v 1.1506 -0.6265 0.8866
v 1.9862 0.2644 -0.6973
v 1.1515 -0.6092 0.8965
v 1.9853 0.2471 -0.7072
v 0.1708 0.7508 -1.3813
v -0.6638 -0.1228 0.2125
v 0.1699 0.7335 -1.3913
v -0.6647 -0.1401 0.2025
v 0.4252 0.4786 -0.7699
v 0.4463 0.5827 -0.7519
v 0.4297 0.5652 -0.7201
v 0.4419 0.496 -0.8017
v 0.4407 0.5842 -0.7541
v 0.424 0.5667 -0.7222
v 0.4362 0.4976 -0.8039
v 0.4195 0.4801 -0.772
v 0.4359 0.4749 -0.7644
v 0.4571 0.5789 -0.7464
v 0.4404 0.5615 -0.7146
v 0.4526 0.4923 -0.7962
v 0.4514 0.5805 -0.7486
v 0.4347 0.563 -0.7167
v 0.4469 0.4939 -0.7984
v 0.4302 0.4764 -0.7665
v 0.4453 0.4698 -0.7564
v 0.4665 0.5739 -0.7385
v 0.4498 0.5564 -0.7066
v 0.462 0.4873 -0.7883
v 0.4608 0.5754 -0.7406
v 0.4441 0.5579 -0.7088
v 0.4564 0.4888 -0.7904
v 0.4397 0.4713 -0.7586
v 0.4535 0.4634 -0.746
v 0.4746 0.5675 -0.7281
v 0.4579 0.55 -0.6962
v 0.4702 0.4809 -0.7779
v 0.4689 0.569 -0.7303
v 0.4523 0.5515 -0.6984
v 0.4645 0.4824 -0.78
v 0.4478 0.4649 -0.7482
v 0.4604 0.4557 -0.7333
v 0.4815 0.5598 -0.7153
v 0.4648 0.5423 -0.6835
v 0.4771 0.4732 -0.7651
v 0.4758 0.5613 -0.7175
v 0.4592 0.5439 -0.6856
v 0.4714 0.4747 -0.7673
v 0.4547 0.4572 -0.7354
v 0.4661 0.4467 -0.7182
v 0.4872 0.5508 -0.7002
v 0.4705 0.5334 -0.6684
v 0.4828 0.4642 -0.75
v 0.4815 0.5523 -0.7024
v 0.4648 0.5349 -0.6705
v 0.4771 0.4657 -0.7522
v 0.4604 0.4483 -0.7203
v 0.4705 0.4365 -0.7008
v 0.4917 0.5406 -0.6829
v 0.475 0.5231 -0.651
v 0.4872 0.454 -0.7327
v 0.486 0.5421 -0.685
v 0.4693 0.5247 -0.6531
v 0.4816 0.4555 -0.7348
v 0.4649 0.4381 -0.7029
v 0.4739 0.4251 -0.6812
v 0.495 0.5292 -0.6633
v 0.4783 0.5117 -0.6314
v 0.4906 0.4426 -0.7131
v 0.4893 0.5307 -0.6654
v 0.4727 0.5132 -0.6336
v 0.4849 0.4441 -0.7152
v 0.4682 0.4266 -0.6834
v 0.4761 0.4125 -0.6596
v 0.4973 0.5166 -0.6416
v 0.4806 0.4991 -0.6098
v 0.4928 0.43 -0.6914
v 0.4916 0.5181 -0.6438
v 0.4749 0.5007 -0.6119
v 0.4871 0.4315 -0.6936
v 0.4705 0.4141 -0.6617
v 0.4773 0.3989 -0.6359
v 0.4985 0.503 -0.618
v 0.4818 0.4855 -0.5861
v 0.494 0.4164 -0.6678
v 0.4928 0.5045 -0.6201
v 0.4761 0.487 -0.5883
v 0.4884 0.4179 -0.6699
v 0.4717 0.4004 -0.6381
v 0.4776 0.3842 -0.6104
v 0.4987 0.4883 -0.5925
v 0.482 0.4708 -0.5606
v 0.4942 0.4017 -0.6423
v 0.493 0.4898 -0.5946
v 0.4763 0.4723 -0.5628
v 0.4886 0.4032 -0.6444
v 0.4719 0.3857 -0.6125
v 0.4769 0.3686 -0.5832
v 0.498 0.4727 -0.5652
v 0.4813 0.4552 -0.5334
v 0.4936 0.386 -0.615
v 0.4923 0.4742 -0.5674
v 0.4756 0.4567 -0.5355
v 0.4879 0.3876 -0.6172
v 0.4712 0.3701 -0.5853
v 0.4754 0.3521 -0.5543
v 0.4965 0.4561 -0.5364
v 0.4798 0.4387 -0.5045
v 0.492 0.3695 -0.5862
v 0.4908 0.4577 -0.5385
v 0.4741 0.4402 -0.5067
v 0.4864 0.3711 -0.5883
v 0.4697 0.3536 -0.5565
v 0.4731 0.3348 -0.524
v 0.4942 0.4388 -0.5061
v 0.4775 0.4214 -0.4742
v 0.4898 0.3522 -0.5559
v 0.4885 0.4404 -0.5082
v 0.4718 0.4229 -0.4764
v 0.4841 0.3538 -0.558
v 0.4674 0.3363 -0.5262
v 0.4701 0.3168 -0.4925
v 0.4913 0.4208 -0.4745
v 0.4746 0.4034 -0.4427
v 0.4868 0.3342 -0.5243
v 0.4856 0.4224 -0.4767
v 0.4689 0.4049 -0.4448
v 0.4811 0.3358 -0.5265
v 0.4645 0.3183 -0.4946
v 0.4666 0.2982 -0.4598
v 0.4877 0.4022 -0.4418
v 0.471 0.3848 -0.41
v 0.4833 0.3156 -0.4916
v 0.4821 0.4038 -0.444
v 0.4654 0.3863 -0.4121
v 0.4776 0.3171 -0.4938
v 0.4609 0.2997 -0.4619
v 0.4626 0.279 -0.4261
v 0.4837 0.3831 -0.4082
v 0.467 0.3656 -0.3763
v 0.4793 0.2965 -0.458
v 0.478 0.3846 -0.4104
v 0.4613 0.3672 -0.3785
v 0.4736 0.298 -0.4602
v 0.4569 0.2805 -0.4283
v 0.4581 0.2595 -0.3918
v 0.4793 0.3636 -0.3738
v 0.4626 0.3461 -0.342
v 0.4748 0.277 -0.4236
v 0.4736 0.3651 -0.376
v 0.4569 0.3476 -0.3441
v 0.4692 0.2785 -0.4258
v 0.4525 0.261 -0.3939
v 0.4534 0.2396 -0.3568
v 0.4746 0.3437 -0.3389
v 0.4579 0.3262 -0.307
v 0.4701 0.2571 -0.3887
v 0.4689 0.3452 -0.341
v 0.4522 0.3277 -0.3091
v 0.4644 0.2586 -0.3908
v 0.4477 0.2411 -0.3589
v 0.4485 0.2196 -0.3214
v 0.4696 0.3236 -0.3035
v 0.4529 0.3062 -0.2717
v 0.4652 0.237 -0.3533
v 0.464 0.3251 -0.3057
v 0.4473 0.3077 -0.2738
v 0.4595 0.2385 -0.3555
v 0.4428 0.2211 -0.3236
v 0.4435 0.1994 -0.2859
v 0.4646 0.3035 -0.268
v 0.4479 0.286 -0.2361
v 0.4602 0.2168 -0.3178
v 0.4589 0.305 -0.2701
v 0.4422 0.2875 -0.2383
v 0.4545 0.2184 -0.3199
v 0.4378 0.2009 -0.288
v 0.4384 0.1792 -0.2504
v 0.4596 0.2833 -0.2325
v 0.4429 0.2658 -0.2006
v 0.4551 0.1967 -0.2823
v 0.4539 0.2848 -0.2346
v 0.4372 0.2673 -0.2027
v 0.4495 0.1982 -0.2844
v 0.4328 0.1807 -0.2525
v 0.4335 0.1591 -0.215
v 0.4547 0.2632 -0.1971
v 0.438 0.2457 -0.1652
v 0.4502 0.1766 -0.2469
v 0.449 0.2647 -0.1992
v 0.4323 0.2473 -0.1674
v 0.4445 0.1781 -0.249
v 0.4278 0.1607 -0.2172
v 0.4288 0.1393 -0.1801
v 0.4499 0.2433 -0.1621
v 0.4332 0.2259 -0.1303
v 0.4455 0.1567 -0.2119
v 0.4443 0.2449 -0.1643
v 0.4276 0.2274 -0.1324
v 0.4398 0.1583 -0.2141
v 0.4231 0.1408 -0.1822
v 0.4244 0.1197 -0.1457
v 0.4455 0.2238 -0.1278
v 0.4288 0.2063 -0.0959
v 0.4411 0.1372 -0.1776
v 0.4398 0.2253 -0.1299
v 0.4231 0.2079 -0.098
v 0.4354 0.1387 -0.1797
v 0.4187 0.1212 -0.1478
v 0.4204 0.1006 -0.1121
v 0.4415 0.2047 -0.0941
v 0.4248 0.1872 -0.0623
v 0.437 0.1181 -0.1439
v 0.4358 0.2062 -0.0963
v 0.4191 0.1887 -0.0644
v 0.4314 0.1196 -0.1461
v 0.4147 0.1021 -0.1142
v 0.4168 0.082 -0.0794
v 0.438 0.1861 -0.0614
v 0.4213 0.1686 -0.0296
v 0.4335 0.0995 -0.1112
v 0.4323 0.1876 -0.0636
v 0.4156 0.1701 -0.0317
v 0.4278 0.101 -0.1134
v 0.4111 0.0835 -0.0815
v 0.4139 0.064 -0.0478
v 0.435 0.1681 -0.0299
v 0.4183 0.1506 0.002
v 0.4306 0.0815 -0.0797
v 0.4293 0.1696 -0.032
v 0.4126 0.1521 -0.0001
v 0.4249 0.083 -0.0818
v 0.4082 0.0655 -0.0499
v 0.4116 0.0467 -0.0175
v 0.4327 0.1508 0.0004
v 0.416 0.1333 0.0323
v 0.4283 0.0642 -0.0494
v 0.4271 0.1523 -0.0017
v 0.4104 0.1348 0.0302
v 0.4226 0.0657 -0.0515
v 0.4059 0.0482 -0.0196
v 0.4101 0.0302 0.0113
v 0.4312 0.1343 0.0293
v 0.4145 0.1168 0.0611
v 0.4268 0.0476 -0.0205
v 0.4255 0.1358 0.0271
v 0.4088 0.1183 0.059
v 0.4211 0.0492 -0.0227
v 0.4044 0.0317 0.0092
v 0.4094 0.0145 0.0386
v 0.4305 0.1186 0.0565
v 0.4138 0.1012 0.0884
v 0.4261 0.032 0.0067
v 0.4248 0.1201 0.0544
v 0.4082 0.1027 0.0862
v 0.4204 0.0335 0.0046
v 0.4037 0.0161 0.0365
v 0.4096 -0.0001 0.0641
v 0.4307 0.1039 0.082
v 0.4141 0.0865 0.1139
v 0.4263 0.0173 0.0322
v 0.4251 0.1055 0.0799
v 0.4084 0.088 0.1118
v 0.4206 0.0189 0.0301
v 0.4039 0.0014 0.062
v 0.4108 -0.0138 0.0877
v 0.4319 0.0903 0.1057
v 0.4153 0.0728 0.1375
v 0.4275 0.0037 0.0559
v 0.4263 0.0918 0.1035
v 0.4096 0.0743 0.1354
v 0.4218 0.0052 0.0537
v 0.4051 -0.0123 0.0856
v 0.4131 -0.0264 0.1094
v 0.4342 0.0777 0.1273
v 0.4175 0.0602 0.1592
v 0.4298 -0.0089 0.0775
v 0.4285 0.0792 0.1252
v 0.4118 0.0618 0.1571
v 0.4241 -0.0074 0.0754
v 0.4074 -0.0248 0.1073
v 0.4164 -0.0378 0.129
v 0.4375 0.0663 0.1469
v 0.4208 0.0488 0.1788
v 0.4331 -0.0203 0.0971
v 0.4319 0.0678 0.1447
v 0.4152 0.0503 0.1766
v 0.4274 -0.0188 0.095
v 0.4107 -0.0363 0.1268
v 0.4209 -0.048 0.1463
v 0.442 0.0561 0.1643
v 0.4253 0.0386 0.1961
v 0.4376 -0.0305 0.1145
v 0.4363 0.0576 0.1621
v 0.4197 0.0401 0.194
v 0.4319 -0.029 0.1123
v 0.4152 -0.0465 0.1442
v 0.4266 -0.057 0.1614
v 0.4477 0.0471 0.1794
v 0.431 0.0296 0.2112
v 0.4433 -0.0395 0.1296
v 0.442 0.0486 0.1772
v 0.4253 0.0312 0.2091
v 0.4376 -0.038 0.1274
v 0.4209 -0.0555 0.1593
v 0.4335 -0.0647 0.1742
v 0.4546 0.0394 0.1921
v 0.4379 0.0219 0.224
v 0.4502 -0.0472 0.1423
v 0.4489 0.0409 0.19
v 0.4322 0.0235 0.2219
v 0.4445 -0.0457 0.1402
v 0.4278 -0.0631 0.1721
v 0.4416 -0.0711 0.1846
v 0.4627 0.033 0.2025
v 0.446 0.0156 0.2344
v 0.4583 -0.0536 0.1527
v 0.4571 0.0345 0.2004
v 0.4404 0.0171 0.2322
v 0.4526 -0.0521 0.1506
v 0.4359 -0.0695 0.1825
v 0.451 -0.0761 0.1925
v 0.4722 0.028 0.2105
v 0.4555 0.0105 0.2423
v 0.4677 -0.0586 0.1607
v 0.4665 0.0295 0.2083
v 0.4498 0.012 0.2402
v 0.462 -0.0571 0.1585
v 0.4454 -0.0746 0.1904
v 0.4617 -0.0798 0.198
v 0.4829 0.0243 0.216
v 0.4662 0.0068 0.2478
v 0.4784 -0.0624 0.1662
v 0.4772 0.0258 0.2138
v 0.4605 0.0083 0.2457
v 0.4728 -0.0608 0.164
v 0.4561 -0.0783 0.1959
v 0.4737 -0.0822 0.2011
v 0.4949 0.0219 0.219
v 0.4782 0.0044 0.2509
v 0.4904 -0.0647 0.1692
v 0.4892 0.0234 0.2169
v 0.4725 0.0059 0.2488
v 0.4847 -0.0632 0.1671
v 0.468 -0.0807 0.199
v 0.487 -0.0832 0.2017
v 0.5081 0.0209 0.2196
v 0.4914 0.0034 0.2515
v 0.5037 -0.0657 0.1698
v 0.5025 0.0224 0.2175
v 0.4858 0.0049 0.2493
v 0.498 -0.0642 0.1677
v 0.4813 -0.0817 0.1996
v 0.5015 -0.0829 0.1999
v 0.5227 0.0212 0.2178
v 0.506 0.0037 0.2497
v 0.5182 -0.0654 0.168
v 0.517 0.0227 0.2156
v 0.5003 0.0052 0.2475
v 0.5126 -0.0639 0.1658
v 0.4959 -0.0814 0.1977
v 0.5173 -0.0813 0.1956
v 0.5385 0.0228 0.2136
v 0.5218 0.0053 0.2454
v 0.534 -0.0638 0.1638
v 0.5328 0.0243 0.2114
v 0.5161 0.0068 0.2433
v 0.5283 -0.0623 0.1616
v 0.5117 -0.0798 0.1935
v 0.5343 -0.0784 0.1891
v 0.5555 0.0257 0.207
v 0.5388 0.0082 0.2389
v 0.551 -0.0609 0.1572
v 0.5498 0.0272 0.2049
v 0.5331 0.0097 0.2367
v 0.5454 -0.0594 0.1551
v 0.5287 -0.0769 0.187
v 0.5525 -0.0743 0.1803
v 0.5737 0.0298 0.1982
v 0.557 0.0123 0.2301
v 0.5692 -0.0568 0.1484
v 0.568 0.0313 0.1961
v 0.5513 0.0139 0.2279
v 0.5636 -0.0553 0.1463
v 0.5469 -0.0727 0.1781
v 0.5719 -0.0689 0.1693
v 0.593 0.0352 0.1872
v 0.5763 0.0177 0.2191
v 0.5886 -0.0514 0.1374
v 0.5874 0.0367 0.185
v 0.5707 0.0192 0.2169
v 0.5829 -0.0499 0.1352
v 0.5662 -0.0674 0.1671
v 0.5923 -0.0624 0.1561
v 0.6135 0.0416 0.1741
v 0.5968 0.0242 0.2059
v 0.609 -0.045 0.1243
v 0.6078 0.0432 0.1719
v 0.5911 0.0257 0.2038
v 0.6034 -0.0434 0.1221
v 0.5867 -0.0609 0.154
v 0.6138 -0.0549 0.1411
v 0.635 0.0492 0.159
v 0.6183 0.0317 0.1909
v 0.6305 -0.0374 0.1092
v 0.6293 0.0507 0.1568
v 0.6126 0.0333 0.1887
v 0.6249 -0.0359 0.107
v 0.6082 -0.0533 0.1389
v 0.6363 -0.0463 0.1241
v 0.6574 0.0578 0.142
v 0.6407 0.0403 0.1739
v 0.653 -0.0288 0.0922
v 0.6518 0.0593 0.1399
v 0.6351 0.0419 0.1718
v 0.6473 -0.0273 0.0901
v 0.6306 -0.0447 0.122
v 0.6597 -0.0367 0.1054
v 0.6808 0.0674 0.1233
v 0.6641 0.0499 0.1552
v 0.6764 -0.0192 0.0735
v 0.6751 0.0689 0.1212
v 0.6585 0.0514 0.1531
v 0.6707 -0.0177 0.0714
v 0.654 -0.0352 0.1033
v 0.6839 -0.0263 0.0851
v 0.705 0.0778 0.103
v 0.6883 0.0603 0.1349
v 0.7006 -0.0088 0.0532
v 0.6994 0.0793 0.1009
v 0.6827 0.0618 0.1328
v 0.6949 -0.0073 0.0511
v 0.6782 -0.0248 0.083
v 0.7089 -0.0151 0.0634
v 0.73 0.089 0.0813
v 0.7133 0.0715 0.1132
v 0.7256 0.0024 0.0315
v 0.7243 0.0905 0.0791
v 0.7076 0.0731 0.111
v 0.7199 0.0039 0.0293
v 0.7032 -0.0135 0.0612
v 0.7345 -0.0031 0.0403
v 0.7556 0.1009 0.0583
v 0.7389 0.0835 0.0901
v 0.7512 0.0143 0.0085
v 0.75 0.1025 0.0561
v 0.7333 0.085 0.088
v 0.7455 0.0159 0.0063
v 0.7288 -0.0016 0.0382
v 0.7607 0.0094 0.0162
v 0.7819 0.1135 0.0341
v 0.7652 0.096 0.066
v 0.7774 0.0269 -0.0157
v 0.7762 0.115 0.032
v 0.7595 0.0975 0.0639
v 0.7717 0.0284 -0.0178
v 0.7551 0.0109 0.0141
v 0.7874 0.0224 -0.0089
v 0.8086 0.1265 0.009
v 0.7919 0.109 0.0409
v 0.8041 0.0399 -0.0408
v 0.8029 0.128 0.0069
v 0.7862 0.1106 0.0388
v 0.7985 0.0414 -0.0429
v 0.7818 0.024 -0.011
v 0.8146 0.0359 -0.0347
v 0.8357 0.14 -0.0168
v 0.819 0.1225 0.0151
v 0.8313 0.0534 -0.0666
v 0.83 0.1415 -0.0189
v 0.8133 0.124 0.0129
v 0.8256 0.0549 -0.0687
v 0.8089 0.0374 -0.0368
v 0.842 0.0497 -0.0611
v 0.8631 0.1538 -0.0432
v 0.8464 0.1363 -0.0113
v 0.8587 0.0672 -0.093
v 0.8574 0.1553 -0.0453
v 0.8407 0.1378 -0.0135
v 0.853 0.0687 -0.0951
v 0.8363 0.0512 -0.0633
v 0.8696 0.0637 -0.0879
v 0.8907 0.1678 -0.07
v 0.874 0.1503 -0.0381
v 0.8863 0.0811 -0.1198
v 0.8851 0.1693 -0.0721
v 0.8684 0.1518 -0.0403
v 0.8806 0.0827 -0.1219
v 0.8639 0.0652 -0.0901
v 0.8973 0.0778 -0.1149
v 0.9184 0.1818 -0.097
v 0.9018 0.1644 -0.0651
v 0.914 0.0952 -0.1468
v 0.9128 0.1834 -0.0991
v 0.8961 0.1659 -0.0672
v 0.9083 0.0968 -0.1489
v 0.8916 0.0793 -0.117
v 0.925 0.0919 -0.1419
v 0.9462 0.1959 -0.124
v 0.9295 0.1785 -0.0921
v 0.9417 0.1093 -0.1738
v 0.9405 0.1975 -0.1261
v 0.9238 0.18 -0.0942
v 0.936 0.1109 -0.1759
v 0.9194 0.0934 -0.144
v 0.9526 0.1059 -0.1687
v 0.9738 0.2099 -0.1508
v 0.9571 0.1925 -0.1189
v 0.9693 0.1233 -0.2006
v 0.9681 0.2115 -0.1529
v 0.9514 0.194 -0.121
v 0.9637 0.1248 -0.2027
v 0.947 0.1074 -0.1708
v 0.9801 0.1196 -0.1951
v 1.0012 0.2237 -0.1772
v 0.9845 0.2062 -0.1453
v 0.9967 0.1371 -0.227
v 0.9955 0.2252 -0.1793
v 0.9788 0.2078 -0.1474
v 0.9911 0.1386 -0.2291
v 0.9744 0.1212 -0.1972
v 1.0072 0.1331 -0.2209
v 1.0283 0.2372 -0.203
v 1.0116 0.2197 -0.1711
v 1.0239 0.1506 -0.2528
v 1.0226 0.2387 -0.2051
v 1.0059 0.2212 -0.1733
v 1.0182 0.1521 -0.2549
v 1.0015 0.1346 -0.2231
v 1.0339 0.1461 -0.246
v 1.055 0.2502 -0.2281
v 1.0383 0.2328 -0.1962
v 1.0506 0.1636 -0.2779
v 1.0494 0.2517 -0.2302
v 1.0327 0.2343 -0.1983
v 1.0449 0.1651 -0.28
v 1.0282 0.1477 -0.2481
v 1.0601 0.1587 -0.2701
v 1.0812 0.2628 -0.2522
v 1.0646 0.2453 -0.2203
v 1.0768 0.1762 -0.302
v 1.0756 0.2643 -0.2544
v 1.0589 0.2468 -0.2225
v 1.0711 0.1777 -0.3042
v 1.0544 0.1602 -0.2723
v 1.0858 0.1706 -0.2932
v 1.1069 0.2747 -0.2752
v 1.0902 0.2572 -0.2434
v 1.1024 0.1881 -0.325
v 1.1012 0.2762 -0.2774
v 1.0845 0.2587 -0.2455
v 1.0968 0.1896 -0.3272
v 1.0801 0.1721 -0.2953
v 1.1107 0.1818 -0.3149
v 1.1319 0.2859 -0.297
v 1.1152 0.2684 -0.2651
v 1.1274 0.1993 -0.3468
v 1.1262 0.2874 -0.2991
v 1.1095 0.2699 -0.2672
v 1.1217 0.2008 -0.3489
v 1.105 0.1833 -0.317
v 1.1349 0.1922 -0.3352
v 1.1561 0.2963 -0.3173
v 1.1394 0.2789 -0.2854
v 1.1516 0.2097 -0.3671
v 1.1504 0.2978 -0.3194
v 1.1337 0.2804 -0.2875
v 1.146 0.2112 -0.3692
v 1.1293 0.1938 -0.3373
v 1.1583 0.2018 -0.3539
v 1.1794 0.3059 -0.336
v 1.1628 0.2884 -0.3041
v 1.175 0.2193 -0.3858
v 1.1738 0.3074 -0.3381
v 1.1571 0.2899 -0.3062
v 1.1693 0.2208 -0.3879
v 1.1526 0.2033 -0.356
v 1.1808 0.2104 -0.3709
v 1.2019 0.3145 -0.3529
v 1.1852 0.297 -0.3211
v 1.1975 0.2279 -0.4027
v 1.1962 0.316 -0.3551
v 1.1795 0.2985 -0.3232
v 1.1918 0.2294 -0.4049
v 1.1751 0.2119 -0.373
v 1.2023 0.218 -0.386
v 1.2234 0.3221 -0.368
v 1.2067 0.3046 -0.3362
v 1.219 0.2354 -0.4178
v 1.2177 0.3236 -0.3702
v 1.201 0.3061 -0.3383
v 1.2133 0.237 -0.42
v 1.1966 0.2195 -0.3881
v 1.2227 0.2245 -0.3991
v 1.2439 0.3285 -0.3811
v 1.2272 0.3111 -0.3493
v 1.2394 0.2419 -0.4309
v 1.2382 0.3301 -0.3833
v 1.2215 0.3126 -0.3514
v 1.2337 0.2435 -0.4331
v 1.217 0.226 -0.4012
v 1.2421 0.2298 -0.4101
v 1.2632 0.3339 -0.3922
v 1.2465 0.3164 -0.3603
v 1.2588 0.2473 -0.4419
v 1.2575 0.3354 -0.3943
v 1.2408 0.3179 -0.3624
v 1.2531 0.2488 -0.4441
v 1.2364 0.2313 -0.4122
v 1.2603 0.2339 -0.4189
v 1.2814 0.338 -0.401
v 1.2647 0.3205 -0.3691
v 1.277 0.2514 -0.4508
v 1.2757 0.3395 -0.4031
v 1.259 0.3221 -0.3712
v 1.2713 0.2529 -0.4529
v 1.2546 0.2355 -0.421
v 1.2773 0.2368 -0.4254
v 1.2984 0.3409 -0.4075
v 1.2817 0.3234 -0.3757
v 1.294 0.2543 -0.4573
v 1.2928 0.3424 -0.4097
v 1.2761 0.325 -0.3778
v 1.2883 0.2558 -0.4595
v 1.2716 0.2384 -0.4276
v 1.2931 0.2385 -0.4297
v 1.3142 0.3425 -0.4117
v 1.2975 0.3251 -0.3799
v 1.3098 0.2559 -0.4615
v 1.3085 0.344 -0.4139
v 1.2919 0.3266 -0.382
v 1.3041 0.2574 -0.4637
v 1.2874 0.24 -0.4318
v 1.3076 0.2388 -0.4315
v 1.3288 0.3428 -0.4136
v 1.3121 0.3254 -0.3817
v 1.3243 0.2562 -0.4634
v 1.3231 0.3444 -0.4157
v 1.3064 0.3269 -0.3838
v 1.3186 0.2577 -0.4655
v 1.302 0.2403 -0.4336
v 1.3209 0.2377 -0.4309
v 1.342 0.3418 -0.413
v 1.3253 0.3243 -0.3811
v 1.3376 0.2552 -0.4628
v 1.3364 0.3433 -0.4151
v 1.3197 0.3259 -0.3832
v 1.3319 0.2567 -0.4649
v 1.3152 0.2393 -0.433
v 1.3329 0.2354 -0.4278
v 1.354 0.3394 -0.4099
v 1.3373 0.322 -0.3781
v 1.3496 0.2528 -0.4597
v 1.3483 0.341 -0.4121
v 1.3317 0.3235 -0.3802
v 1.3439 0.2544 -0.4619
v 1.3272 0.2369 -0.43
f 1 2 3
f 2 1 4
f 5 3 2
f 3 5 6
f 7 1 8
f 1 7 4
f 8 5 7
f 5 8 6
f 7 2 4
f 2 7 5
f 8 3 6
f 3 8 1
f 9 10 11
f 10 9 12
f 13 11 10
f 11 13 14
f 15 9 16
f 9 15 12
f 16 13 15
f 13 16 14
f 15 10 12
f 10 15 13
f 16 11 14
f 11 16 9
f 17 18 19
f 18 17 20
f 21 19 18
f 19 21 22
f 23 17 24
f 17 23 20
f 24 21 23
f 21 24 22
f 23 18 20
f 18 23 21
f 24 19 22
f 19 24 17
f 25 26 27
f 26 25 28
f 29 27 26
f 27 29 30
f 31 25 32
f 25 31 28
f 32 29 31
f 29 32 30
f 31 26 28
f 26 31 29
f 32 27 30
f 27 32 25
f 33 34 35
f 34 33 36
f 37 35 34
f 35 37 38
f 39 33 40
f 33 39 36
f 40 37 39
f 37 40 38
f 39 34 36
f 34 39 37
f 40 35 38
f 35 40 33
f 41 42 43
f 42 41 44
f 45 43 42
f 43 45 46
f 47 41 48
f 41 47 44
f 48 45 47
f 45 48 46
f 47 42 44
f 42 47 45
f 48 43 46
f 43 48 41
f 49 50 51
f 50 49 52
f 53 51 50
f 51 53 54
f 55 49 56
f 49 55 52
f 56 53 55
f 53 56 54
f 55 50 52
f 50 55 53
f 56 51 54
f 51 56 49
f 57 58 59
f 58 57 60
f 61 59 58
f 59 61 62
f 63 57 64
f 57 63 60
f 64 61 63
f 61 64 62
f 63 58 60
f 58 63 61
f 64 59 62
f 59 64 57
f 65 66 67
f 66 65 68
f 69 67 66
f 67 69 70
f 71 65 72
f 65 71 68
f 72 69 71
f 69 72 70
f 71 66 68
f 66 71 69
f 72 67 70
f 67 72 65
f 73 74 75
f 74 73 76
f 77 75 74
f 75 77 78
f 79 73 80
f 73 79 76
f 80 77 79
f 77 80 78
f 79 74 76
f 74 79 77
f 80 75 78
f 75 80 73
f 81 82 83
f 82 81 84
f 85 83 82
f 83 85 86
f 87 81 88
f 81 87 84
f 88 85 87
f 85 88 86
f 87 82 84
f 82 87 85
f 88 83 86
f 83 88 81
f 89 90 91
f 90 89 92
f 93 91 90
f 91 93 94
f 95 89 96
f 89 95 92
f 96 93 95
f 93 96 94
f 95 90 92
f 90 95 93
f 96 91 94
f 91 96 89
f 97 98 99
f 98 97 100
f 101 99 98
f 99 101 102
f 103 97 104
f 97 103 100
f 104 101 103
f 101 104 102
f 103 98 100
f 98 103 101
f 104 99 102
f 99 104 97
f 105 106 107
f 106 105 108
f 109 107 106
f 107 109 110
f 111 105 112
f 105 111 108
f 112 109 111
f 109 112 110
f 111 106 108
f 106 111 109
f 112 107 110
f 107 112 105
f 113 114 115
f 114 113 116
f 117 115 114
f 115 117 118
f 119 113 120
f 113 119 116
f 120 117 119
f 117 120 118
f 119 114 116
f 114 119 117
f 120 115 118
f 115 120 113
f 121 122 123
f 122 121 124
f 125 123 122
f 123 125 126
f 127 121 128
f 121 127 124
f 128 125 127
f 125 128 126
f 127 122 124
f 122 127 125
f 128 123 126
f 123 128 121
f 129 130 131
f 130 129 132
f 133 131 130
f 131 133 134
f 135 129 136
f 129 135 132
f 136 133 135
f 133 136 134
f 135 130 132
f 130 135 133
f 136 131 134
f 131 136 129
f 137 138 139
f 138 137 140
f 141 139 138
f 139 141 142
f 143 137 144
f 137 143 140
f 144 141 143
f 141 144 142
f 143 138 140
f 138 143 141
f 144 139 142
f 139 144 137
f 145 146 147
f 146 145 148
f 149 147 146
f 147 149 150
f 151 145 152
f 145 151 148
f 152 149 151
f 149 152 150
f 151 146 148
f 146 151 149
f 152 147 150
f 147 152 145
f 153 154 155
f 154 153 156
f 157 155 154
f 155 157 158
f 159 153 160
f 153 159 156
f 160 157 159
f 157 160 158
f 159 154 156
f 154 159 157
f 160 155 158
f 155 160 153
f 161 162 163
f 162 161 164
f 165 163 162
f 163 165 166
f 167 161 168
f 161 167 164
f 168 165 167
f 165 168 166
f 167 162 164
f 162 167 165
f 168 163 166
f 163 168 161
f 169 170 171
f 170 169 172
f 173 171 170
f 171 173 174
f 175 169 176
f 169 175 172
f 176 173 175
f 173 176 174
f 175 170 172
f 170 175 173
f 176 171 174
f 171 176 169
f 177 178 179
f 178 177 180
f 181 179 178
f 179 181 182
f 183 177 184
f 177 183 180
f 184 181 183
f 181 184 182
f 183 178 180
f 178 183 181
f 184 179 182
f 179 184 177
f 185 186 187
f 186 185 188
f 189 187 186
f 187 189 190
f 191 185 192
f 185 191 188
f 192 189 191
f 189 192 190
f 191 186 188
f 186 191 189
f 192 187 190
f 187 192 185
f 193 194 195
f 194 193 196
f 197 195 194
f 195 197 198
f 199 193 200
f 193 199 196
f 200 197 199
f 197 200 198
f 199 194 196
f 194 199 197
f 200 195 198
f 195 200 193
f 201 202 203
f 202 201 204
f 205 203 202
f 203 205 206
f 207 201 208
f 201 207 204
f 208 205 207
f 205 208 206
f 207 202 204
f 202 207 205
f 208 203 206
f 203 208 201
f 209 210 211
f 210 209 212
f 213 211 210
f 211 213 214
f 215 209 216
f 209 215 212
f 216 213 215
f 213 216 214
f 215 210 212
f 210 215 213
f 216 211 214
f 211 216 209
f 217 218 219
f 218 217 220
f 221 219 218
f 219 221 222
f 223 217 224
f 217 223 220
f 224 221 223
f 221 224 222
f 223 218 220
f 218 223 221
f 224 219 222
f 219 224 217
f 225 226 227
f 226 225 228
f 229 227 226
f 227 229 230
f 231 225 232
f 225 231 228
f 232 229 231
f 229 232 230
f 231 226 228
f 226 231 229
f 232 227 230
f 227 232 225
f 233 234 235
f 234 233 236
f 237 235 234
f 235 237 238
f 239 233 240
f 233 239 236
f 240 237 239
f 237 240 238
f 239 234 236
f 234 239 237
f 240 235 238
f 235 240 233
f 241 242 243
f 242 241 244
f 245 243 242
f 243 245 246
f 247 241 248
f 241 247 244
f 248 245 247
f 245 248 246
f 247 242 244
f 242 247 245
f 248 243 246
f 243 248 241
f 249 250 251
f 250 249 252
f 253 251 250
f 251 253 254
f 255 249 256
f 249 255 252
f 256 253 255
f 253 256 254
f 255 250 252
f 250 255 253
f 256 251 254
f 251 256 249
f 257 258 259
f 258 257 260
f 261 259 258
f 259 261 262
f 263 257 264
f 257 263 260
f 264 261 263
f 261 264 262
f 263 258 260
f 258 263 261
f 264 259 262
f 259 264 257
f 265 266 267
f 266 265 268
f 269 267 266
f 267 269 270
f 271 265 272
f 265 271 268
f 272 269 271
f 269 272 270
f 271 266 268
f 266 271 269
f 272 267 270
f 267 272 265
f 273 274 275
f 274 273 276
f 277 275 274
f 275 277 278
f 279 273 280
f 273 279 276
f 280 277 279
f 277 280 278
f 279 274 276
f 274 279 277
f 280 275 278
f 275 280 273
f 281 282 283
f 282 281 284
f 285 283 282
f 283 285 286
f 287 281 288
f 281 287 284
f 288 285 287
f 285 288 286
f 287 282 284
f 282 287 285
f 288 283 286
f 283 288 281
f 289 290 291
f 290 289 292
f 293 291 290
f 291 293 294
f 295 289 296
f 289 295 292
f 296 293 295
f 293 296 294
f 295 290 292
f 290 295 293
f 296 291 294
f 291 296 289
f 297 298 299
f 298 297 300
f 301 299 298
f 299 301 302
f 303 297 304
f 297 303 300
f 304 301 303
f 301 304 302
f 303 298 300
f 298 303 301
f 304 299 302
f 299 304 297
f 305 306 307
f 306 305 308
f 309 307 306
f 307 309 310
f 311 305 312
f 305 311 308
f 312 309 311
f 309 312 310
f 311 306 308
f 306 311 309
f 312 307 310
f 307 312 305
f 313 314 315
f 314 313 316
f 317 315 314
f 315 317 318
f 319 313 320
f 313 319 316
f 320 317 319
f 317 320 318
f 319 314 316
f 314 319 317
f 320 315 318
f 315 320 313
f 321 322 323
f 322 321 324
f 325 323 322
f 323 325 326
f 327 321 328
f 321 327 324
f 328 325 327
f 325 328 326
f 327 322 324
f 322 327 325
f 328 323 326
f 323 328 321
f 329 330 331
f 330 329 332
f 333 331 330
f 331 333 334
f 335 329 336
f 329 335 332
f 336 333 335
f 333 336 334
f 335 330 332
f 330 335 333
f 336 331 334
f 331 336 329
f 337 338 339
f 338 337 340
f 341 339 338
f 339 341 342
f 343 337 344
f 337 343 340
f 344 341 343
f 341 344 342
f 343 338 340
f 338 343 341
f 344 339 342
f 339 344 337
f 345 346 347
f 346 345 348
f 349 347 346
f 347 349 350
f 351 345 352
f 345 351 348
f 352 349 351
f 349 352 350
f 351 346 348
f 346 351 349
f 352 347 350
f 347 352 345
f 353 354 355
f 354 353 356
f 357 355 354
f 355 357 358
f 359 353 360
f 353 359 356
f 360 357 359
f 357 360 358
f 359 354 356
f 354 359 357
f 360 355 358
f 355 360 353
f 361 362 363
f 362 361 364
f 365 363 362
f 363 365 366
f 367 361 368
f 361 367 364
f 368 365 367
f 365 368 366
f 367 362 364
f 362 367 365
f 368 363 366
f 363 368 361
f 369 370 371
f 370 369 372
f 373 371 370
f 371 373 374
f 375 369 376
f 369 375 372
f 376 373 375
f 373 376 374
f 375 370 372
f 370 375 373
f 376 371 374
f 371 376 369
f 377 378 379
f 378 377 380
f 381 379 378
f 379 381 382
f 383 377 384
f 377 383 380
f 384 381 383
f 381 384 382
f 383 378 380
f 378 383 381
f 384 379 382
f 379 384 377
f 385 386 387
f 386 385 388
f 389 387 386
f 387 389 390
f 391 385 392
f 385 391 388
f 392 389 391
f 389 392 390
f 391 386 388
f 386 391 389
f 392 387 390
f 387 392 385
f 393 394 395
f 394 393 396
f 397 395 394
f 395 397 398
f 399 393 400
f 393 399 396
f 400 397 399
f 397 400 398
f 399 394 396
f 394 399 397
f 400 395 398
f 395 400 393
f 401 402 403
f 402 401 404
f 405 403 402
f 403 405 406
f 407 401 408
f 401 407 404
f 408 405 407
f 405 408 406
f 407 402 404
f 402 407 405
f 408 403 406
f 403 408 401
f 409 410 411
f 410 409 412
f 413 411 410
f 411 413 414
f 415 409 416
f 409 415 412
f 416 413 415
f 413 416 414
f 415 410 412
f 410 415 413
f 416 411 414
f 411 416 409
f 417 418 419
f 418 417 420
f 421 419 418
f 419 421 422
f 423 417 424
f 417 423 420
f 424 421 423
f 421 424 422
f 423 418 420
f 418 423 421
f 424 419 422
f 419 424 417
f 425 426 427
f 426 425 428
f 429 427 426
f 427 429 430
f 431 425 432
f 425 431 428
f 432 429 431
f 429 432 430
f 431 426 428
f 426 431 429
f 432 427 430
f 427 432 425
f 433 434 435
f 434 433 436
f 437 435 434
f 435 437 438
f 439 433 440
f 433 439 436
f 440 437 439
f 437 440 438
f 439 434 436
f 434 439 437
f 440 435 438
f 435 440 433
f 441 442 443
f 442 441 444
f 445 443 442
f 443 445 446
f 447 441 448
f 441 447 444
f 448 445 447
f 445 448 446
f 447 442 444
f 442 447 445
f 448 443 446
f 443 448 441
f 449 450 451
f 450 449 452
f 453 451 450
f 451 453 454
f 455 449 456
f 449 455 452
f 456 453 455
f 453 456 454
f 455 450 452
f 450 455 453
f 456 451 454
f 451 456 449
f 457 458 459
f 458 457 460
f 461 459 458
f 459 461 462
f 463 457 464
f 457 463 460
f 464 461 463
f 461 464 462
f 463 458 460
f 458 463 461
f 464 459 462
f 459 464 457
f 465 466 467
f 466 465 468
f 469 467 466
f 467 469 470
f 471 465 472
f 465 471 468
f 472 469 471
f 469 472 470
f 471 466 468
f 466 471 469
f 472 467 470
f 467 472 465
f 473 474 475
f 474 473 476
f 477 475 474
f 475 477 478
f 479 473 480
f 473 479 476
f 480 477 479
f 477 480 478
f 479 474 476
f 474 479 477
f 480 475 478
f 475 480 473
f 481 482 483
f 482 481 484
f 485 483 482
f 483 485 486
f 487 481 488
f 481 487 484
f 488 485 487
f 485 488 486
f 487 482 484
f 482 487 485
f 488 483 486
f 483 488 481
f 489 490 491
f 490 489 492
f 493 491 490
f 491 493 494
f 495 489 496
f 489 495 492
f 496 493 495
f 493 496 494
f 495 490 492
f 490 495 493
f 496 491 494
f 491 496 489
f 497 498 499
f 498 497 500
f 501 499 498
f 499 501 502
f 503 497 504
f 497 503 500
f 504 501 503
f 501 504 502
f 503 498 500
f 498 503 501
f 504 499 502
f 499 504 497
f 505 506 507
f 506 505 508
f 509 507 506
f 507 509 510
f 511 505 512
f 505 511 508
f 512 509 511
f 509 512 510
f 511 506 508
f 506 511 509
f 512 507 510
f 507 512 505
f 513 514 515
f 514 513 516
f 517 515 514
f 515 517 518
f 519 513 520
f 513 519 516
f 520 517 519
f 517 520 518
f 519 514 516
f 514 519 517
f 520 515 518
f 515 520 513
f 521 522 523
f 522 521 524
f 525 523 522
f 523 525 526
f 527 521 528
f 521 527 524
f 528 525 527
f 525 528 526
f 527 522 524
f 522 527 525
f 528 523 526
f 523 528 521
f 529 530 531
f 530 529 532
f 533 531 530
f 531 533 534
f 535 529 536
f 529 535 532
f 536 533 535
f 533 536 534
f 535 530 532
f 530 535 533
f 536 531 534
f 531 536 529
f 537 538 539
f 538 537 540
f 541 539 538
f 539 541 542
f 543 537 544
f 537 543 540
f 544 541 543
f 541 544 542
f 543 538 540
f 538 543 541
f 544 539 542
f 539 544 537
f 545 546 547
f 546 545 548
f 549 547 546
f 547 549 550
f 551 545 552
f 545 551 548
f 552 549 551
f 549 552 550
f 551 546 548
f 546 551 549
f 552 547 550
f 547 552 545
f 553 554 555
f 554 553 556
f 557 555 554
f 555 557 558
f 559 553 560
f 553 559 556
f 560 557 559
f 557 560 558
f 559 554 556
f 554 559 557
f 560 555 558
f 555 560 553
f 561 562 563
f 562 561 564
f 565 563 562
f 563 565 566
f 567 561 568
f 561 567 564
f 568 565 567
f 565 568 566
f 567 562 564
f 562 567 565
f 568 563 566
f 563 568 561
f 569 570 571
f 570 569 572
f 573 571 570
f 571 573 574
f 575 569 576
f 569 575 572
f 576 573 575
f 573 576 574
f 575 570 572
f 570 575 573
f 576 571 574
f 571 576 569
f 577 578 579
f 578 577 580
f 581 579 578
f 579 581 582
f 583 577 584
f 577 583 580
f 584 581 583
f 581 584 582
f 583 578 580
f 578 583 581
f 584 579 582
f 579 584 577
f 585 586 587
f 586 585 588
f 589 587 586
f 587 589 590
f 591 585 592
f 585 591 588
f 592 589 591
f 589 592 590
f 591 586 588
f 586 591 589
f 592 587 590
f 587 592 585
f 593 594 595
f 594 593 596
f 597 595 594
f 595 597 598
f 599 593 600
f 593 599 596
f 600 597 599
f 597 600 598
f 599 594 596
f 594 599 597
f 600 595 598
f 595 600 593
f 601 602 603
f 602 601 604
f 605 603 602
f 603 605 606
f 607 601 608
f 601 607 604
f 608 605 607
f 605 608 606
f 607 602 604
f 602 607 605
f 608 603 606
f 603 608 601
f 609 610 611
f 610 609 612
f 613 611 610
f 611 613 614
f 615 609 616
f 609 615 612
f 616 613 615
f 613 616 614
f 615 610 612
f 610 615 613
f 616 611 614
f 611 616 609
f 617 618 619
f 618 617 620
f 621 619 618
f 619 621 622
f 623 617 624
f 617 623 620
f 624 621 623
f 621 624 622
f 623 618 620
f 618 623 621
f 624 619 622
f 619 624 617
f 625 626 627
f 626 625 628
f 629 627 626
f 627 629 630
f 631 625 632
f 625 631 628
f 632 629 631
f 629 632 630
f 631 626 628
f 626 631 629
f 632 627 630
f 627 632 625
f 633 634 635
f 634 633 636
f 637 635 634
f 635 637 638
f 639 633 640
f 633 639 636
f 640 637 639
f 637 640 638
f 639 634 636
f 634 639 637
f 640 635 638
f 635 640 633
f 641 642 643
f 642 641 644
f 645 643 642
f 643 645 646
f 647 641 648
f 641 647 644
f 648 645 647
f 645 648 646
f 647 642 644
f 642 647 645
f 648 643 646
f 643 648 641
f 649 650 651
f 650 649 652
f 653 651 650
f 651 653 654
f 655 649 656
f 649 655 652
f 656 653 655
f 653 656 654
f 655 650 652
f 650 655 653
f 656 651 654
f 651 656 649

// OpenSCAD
//  OpenScad code generated from OSKAR python.
//  OSKAR Compiler written by Bryce Summers for Larry Cuba
//  Compiled on June 12, 2017
$fn=130;
$vpr = [0, 0, 0];   // vpr system variable
$vpd = 6.0;         // vpd system variable
$vpt = [0, 0, 0];   // vpt system variable


function modulo(dividend, divisor) =
   dividend % divisor;

// return 0, divisor, 2*divisor, etc based on which interval x is in.
function step(x, divisor) = 
    floor(x/divisor)*divisor;

module floor()
{
   Global_t = $t;
   steps = 1;
   step_size = 1.0/steps;
   // Iteration from 0 to 1 in 1 equal steps.
   for (i=[0:step_size:1])
   {
      translate([-.5, -.5, -.05])
      scale([2, 2, .02])
      color([1, 1, 1, 1])
      cube();
   }
}
module cosine()
{
   Global_t = $t;
   steps = 80;
   step_size = 1.0/steps;
   // Iteration from 0 to 1 in 80 equal steps.
   for (i=[0:step_size:1])
   {
      translate([0, .5, 0])
      scale([1, .5, 1])
      translate([i, cos ( ( i * 360 ) + ( Global_t * 360 ) ), .05])
      scale([.5, 4, 5])
      scale([.0125, .02, .02])
      color([1, 1, 1, 1])
      cube();
   }
}
module draw()
{
      floor();
      cosine();
}

// Draw the root module.
translate([0, 0, 0])rotate([-58,-20, -15]) //set POV
draw();
